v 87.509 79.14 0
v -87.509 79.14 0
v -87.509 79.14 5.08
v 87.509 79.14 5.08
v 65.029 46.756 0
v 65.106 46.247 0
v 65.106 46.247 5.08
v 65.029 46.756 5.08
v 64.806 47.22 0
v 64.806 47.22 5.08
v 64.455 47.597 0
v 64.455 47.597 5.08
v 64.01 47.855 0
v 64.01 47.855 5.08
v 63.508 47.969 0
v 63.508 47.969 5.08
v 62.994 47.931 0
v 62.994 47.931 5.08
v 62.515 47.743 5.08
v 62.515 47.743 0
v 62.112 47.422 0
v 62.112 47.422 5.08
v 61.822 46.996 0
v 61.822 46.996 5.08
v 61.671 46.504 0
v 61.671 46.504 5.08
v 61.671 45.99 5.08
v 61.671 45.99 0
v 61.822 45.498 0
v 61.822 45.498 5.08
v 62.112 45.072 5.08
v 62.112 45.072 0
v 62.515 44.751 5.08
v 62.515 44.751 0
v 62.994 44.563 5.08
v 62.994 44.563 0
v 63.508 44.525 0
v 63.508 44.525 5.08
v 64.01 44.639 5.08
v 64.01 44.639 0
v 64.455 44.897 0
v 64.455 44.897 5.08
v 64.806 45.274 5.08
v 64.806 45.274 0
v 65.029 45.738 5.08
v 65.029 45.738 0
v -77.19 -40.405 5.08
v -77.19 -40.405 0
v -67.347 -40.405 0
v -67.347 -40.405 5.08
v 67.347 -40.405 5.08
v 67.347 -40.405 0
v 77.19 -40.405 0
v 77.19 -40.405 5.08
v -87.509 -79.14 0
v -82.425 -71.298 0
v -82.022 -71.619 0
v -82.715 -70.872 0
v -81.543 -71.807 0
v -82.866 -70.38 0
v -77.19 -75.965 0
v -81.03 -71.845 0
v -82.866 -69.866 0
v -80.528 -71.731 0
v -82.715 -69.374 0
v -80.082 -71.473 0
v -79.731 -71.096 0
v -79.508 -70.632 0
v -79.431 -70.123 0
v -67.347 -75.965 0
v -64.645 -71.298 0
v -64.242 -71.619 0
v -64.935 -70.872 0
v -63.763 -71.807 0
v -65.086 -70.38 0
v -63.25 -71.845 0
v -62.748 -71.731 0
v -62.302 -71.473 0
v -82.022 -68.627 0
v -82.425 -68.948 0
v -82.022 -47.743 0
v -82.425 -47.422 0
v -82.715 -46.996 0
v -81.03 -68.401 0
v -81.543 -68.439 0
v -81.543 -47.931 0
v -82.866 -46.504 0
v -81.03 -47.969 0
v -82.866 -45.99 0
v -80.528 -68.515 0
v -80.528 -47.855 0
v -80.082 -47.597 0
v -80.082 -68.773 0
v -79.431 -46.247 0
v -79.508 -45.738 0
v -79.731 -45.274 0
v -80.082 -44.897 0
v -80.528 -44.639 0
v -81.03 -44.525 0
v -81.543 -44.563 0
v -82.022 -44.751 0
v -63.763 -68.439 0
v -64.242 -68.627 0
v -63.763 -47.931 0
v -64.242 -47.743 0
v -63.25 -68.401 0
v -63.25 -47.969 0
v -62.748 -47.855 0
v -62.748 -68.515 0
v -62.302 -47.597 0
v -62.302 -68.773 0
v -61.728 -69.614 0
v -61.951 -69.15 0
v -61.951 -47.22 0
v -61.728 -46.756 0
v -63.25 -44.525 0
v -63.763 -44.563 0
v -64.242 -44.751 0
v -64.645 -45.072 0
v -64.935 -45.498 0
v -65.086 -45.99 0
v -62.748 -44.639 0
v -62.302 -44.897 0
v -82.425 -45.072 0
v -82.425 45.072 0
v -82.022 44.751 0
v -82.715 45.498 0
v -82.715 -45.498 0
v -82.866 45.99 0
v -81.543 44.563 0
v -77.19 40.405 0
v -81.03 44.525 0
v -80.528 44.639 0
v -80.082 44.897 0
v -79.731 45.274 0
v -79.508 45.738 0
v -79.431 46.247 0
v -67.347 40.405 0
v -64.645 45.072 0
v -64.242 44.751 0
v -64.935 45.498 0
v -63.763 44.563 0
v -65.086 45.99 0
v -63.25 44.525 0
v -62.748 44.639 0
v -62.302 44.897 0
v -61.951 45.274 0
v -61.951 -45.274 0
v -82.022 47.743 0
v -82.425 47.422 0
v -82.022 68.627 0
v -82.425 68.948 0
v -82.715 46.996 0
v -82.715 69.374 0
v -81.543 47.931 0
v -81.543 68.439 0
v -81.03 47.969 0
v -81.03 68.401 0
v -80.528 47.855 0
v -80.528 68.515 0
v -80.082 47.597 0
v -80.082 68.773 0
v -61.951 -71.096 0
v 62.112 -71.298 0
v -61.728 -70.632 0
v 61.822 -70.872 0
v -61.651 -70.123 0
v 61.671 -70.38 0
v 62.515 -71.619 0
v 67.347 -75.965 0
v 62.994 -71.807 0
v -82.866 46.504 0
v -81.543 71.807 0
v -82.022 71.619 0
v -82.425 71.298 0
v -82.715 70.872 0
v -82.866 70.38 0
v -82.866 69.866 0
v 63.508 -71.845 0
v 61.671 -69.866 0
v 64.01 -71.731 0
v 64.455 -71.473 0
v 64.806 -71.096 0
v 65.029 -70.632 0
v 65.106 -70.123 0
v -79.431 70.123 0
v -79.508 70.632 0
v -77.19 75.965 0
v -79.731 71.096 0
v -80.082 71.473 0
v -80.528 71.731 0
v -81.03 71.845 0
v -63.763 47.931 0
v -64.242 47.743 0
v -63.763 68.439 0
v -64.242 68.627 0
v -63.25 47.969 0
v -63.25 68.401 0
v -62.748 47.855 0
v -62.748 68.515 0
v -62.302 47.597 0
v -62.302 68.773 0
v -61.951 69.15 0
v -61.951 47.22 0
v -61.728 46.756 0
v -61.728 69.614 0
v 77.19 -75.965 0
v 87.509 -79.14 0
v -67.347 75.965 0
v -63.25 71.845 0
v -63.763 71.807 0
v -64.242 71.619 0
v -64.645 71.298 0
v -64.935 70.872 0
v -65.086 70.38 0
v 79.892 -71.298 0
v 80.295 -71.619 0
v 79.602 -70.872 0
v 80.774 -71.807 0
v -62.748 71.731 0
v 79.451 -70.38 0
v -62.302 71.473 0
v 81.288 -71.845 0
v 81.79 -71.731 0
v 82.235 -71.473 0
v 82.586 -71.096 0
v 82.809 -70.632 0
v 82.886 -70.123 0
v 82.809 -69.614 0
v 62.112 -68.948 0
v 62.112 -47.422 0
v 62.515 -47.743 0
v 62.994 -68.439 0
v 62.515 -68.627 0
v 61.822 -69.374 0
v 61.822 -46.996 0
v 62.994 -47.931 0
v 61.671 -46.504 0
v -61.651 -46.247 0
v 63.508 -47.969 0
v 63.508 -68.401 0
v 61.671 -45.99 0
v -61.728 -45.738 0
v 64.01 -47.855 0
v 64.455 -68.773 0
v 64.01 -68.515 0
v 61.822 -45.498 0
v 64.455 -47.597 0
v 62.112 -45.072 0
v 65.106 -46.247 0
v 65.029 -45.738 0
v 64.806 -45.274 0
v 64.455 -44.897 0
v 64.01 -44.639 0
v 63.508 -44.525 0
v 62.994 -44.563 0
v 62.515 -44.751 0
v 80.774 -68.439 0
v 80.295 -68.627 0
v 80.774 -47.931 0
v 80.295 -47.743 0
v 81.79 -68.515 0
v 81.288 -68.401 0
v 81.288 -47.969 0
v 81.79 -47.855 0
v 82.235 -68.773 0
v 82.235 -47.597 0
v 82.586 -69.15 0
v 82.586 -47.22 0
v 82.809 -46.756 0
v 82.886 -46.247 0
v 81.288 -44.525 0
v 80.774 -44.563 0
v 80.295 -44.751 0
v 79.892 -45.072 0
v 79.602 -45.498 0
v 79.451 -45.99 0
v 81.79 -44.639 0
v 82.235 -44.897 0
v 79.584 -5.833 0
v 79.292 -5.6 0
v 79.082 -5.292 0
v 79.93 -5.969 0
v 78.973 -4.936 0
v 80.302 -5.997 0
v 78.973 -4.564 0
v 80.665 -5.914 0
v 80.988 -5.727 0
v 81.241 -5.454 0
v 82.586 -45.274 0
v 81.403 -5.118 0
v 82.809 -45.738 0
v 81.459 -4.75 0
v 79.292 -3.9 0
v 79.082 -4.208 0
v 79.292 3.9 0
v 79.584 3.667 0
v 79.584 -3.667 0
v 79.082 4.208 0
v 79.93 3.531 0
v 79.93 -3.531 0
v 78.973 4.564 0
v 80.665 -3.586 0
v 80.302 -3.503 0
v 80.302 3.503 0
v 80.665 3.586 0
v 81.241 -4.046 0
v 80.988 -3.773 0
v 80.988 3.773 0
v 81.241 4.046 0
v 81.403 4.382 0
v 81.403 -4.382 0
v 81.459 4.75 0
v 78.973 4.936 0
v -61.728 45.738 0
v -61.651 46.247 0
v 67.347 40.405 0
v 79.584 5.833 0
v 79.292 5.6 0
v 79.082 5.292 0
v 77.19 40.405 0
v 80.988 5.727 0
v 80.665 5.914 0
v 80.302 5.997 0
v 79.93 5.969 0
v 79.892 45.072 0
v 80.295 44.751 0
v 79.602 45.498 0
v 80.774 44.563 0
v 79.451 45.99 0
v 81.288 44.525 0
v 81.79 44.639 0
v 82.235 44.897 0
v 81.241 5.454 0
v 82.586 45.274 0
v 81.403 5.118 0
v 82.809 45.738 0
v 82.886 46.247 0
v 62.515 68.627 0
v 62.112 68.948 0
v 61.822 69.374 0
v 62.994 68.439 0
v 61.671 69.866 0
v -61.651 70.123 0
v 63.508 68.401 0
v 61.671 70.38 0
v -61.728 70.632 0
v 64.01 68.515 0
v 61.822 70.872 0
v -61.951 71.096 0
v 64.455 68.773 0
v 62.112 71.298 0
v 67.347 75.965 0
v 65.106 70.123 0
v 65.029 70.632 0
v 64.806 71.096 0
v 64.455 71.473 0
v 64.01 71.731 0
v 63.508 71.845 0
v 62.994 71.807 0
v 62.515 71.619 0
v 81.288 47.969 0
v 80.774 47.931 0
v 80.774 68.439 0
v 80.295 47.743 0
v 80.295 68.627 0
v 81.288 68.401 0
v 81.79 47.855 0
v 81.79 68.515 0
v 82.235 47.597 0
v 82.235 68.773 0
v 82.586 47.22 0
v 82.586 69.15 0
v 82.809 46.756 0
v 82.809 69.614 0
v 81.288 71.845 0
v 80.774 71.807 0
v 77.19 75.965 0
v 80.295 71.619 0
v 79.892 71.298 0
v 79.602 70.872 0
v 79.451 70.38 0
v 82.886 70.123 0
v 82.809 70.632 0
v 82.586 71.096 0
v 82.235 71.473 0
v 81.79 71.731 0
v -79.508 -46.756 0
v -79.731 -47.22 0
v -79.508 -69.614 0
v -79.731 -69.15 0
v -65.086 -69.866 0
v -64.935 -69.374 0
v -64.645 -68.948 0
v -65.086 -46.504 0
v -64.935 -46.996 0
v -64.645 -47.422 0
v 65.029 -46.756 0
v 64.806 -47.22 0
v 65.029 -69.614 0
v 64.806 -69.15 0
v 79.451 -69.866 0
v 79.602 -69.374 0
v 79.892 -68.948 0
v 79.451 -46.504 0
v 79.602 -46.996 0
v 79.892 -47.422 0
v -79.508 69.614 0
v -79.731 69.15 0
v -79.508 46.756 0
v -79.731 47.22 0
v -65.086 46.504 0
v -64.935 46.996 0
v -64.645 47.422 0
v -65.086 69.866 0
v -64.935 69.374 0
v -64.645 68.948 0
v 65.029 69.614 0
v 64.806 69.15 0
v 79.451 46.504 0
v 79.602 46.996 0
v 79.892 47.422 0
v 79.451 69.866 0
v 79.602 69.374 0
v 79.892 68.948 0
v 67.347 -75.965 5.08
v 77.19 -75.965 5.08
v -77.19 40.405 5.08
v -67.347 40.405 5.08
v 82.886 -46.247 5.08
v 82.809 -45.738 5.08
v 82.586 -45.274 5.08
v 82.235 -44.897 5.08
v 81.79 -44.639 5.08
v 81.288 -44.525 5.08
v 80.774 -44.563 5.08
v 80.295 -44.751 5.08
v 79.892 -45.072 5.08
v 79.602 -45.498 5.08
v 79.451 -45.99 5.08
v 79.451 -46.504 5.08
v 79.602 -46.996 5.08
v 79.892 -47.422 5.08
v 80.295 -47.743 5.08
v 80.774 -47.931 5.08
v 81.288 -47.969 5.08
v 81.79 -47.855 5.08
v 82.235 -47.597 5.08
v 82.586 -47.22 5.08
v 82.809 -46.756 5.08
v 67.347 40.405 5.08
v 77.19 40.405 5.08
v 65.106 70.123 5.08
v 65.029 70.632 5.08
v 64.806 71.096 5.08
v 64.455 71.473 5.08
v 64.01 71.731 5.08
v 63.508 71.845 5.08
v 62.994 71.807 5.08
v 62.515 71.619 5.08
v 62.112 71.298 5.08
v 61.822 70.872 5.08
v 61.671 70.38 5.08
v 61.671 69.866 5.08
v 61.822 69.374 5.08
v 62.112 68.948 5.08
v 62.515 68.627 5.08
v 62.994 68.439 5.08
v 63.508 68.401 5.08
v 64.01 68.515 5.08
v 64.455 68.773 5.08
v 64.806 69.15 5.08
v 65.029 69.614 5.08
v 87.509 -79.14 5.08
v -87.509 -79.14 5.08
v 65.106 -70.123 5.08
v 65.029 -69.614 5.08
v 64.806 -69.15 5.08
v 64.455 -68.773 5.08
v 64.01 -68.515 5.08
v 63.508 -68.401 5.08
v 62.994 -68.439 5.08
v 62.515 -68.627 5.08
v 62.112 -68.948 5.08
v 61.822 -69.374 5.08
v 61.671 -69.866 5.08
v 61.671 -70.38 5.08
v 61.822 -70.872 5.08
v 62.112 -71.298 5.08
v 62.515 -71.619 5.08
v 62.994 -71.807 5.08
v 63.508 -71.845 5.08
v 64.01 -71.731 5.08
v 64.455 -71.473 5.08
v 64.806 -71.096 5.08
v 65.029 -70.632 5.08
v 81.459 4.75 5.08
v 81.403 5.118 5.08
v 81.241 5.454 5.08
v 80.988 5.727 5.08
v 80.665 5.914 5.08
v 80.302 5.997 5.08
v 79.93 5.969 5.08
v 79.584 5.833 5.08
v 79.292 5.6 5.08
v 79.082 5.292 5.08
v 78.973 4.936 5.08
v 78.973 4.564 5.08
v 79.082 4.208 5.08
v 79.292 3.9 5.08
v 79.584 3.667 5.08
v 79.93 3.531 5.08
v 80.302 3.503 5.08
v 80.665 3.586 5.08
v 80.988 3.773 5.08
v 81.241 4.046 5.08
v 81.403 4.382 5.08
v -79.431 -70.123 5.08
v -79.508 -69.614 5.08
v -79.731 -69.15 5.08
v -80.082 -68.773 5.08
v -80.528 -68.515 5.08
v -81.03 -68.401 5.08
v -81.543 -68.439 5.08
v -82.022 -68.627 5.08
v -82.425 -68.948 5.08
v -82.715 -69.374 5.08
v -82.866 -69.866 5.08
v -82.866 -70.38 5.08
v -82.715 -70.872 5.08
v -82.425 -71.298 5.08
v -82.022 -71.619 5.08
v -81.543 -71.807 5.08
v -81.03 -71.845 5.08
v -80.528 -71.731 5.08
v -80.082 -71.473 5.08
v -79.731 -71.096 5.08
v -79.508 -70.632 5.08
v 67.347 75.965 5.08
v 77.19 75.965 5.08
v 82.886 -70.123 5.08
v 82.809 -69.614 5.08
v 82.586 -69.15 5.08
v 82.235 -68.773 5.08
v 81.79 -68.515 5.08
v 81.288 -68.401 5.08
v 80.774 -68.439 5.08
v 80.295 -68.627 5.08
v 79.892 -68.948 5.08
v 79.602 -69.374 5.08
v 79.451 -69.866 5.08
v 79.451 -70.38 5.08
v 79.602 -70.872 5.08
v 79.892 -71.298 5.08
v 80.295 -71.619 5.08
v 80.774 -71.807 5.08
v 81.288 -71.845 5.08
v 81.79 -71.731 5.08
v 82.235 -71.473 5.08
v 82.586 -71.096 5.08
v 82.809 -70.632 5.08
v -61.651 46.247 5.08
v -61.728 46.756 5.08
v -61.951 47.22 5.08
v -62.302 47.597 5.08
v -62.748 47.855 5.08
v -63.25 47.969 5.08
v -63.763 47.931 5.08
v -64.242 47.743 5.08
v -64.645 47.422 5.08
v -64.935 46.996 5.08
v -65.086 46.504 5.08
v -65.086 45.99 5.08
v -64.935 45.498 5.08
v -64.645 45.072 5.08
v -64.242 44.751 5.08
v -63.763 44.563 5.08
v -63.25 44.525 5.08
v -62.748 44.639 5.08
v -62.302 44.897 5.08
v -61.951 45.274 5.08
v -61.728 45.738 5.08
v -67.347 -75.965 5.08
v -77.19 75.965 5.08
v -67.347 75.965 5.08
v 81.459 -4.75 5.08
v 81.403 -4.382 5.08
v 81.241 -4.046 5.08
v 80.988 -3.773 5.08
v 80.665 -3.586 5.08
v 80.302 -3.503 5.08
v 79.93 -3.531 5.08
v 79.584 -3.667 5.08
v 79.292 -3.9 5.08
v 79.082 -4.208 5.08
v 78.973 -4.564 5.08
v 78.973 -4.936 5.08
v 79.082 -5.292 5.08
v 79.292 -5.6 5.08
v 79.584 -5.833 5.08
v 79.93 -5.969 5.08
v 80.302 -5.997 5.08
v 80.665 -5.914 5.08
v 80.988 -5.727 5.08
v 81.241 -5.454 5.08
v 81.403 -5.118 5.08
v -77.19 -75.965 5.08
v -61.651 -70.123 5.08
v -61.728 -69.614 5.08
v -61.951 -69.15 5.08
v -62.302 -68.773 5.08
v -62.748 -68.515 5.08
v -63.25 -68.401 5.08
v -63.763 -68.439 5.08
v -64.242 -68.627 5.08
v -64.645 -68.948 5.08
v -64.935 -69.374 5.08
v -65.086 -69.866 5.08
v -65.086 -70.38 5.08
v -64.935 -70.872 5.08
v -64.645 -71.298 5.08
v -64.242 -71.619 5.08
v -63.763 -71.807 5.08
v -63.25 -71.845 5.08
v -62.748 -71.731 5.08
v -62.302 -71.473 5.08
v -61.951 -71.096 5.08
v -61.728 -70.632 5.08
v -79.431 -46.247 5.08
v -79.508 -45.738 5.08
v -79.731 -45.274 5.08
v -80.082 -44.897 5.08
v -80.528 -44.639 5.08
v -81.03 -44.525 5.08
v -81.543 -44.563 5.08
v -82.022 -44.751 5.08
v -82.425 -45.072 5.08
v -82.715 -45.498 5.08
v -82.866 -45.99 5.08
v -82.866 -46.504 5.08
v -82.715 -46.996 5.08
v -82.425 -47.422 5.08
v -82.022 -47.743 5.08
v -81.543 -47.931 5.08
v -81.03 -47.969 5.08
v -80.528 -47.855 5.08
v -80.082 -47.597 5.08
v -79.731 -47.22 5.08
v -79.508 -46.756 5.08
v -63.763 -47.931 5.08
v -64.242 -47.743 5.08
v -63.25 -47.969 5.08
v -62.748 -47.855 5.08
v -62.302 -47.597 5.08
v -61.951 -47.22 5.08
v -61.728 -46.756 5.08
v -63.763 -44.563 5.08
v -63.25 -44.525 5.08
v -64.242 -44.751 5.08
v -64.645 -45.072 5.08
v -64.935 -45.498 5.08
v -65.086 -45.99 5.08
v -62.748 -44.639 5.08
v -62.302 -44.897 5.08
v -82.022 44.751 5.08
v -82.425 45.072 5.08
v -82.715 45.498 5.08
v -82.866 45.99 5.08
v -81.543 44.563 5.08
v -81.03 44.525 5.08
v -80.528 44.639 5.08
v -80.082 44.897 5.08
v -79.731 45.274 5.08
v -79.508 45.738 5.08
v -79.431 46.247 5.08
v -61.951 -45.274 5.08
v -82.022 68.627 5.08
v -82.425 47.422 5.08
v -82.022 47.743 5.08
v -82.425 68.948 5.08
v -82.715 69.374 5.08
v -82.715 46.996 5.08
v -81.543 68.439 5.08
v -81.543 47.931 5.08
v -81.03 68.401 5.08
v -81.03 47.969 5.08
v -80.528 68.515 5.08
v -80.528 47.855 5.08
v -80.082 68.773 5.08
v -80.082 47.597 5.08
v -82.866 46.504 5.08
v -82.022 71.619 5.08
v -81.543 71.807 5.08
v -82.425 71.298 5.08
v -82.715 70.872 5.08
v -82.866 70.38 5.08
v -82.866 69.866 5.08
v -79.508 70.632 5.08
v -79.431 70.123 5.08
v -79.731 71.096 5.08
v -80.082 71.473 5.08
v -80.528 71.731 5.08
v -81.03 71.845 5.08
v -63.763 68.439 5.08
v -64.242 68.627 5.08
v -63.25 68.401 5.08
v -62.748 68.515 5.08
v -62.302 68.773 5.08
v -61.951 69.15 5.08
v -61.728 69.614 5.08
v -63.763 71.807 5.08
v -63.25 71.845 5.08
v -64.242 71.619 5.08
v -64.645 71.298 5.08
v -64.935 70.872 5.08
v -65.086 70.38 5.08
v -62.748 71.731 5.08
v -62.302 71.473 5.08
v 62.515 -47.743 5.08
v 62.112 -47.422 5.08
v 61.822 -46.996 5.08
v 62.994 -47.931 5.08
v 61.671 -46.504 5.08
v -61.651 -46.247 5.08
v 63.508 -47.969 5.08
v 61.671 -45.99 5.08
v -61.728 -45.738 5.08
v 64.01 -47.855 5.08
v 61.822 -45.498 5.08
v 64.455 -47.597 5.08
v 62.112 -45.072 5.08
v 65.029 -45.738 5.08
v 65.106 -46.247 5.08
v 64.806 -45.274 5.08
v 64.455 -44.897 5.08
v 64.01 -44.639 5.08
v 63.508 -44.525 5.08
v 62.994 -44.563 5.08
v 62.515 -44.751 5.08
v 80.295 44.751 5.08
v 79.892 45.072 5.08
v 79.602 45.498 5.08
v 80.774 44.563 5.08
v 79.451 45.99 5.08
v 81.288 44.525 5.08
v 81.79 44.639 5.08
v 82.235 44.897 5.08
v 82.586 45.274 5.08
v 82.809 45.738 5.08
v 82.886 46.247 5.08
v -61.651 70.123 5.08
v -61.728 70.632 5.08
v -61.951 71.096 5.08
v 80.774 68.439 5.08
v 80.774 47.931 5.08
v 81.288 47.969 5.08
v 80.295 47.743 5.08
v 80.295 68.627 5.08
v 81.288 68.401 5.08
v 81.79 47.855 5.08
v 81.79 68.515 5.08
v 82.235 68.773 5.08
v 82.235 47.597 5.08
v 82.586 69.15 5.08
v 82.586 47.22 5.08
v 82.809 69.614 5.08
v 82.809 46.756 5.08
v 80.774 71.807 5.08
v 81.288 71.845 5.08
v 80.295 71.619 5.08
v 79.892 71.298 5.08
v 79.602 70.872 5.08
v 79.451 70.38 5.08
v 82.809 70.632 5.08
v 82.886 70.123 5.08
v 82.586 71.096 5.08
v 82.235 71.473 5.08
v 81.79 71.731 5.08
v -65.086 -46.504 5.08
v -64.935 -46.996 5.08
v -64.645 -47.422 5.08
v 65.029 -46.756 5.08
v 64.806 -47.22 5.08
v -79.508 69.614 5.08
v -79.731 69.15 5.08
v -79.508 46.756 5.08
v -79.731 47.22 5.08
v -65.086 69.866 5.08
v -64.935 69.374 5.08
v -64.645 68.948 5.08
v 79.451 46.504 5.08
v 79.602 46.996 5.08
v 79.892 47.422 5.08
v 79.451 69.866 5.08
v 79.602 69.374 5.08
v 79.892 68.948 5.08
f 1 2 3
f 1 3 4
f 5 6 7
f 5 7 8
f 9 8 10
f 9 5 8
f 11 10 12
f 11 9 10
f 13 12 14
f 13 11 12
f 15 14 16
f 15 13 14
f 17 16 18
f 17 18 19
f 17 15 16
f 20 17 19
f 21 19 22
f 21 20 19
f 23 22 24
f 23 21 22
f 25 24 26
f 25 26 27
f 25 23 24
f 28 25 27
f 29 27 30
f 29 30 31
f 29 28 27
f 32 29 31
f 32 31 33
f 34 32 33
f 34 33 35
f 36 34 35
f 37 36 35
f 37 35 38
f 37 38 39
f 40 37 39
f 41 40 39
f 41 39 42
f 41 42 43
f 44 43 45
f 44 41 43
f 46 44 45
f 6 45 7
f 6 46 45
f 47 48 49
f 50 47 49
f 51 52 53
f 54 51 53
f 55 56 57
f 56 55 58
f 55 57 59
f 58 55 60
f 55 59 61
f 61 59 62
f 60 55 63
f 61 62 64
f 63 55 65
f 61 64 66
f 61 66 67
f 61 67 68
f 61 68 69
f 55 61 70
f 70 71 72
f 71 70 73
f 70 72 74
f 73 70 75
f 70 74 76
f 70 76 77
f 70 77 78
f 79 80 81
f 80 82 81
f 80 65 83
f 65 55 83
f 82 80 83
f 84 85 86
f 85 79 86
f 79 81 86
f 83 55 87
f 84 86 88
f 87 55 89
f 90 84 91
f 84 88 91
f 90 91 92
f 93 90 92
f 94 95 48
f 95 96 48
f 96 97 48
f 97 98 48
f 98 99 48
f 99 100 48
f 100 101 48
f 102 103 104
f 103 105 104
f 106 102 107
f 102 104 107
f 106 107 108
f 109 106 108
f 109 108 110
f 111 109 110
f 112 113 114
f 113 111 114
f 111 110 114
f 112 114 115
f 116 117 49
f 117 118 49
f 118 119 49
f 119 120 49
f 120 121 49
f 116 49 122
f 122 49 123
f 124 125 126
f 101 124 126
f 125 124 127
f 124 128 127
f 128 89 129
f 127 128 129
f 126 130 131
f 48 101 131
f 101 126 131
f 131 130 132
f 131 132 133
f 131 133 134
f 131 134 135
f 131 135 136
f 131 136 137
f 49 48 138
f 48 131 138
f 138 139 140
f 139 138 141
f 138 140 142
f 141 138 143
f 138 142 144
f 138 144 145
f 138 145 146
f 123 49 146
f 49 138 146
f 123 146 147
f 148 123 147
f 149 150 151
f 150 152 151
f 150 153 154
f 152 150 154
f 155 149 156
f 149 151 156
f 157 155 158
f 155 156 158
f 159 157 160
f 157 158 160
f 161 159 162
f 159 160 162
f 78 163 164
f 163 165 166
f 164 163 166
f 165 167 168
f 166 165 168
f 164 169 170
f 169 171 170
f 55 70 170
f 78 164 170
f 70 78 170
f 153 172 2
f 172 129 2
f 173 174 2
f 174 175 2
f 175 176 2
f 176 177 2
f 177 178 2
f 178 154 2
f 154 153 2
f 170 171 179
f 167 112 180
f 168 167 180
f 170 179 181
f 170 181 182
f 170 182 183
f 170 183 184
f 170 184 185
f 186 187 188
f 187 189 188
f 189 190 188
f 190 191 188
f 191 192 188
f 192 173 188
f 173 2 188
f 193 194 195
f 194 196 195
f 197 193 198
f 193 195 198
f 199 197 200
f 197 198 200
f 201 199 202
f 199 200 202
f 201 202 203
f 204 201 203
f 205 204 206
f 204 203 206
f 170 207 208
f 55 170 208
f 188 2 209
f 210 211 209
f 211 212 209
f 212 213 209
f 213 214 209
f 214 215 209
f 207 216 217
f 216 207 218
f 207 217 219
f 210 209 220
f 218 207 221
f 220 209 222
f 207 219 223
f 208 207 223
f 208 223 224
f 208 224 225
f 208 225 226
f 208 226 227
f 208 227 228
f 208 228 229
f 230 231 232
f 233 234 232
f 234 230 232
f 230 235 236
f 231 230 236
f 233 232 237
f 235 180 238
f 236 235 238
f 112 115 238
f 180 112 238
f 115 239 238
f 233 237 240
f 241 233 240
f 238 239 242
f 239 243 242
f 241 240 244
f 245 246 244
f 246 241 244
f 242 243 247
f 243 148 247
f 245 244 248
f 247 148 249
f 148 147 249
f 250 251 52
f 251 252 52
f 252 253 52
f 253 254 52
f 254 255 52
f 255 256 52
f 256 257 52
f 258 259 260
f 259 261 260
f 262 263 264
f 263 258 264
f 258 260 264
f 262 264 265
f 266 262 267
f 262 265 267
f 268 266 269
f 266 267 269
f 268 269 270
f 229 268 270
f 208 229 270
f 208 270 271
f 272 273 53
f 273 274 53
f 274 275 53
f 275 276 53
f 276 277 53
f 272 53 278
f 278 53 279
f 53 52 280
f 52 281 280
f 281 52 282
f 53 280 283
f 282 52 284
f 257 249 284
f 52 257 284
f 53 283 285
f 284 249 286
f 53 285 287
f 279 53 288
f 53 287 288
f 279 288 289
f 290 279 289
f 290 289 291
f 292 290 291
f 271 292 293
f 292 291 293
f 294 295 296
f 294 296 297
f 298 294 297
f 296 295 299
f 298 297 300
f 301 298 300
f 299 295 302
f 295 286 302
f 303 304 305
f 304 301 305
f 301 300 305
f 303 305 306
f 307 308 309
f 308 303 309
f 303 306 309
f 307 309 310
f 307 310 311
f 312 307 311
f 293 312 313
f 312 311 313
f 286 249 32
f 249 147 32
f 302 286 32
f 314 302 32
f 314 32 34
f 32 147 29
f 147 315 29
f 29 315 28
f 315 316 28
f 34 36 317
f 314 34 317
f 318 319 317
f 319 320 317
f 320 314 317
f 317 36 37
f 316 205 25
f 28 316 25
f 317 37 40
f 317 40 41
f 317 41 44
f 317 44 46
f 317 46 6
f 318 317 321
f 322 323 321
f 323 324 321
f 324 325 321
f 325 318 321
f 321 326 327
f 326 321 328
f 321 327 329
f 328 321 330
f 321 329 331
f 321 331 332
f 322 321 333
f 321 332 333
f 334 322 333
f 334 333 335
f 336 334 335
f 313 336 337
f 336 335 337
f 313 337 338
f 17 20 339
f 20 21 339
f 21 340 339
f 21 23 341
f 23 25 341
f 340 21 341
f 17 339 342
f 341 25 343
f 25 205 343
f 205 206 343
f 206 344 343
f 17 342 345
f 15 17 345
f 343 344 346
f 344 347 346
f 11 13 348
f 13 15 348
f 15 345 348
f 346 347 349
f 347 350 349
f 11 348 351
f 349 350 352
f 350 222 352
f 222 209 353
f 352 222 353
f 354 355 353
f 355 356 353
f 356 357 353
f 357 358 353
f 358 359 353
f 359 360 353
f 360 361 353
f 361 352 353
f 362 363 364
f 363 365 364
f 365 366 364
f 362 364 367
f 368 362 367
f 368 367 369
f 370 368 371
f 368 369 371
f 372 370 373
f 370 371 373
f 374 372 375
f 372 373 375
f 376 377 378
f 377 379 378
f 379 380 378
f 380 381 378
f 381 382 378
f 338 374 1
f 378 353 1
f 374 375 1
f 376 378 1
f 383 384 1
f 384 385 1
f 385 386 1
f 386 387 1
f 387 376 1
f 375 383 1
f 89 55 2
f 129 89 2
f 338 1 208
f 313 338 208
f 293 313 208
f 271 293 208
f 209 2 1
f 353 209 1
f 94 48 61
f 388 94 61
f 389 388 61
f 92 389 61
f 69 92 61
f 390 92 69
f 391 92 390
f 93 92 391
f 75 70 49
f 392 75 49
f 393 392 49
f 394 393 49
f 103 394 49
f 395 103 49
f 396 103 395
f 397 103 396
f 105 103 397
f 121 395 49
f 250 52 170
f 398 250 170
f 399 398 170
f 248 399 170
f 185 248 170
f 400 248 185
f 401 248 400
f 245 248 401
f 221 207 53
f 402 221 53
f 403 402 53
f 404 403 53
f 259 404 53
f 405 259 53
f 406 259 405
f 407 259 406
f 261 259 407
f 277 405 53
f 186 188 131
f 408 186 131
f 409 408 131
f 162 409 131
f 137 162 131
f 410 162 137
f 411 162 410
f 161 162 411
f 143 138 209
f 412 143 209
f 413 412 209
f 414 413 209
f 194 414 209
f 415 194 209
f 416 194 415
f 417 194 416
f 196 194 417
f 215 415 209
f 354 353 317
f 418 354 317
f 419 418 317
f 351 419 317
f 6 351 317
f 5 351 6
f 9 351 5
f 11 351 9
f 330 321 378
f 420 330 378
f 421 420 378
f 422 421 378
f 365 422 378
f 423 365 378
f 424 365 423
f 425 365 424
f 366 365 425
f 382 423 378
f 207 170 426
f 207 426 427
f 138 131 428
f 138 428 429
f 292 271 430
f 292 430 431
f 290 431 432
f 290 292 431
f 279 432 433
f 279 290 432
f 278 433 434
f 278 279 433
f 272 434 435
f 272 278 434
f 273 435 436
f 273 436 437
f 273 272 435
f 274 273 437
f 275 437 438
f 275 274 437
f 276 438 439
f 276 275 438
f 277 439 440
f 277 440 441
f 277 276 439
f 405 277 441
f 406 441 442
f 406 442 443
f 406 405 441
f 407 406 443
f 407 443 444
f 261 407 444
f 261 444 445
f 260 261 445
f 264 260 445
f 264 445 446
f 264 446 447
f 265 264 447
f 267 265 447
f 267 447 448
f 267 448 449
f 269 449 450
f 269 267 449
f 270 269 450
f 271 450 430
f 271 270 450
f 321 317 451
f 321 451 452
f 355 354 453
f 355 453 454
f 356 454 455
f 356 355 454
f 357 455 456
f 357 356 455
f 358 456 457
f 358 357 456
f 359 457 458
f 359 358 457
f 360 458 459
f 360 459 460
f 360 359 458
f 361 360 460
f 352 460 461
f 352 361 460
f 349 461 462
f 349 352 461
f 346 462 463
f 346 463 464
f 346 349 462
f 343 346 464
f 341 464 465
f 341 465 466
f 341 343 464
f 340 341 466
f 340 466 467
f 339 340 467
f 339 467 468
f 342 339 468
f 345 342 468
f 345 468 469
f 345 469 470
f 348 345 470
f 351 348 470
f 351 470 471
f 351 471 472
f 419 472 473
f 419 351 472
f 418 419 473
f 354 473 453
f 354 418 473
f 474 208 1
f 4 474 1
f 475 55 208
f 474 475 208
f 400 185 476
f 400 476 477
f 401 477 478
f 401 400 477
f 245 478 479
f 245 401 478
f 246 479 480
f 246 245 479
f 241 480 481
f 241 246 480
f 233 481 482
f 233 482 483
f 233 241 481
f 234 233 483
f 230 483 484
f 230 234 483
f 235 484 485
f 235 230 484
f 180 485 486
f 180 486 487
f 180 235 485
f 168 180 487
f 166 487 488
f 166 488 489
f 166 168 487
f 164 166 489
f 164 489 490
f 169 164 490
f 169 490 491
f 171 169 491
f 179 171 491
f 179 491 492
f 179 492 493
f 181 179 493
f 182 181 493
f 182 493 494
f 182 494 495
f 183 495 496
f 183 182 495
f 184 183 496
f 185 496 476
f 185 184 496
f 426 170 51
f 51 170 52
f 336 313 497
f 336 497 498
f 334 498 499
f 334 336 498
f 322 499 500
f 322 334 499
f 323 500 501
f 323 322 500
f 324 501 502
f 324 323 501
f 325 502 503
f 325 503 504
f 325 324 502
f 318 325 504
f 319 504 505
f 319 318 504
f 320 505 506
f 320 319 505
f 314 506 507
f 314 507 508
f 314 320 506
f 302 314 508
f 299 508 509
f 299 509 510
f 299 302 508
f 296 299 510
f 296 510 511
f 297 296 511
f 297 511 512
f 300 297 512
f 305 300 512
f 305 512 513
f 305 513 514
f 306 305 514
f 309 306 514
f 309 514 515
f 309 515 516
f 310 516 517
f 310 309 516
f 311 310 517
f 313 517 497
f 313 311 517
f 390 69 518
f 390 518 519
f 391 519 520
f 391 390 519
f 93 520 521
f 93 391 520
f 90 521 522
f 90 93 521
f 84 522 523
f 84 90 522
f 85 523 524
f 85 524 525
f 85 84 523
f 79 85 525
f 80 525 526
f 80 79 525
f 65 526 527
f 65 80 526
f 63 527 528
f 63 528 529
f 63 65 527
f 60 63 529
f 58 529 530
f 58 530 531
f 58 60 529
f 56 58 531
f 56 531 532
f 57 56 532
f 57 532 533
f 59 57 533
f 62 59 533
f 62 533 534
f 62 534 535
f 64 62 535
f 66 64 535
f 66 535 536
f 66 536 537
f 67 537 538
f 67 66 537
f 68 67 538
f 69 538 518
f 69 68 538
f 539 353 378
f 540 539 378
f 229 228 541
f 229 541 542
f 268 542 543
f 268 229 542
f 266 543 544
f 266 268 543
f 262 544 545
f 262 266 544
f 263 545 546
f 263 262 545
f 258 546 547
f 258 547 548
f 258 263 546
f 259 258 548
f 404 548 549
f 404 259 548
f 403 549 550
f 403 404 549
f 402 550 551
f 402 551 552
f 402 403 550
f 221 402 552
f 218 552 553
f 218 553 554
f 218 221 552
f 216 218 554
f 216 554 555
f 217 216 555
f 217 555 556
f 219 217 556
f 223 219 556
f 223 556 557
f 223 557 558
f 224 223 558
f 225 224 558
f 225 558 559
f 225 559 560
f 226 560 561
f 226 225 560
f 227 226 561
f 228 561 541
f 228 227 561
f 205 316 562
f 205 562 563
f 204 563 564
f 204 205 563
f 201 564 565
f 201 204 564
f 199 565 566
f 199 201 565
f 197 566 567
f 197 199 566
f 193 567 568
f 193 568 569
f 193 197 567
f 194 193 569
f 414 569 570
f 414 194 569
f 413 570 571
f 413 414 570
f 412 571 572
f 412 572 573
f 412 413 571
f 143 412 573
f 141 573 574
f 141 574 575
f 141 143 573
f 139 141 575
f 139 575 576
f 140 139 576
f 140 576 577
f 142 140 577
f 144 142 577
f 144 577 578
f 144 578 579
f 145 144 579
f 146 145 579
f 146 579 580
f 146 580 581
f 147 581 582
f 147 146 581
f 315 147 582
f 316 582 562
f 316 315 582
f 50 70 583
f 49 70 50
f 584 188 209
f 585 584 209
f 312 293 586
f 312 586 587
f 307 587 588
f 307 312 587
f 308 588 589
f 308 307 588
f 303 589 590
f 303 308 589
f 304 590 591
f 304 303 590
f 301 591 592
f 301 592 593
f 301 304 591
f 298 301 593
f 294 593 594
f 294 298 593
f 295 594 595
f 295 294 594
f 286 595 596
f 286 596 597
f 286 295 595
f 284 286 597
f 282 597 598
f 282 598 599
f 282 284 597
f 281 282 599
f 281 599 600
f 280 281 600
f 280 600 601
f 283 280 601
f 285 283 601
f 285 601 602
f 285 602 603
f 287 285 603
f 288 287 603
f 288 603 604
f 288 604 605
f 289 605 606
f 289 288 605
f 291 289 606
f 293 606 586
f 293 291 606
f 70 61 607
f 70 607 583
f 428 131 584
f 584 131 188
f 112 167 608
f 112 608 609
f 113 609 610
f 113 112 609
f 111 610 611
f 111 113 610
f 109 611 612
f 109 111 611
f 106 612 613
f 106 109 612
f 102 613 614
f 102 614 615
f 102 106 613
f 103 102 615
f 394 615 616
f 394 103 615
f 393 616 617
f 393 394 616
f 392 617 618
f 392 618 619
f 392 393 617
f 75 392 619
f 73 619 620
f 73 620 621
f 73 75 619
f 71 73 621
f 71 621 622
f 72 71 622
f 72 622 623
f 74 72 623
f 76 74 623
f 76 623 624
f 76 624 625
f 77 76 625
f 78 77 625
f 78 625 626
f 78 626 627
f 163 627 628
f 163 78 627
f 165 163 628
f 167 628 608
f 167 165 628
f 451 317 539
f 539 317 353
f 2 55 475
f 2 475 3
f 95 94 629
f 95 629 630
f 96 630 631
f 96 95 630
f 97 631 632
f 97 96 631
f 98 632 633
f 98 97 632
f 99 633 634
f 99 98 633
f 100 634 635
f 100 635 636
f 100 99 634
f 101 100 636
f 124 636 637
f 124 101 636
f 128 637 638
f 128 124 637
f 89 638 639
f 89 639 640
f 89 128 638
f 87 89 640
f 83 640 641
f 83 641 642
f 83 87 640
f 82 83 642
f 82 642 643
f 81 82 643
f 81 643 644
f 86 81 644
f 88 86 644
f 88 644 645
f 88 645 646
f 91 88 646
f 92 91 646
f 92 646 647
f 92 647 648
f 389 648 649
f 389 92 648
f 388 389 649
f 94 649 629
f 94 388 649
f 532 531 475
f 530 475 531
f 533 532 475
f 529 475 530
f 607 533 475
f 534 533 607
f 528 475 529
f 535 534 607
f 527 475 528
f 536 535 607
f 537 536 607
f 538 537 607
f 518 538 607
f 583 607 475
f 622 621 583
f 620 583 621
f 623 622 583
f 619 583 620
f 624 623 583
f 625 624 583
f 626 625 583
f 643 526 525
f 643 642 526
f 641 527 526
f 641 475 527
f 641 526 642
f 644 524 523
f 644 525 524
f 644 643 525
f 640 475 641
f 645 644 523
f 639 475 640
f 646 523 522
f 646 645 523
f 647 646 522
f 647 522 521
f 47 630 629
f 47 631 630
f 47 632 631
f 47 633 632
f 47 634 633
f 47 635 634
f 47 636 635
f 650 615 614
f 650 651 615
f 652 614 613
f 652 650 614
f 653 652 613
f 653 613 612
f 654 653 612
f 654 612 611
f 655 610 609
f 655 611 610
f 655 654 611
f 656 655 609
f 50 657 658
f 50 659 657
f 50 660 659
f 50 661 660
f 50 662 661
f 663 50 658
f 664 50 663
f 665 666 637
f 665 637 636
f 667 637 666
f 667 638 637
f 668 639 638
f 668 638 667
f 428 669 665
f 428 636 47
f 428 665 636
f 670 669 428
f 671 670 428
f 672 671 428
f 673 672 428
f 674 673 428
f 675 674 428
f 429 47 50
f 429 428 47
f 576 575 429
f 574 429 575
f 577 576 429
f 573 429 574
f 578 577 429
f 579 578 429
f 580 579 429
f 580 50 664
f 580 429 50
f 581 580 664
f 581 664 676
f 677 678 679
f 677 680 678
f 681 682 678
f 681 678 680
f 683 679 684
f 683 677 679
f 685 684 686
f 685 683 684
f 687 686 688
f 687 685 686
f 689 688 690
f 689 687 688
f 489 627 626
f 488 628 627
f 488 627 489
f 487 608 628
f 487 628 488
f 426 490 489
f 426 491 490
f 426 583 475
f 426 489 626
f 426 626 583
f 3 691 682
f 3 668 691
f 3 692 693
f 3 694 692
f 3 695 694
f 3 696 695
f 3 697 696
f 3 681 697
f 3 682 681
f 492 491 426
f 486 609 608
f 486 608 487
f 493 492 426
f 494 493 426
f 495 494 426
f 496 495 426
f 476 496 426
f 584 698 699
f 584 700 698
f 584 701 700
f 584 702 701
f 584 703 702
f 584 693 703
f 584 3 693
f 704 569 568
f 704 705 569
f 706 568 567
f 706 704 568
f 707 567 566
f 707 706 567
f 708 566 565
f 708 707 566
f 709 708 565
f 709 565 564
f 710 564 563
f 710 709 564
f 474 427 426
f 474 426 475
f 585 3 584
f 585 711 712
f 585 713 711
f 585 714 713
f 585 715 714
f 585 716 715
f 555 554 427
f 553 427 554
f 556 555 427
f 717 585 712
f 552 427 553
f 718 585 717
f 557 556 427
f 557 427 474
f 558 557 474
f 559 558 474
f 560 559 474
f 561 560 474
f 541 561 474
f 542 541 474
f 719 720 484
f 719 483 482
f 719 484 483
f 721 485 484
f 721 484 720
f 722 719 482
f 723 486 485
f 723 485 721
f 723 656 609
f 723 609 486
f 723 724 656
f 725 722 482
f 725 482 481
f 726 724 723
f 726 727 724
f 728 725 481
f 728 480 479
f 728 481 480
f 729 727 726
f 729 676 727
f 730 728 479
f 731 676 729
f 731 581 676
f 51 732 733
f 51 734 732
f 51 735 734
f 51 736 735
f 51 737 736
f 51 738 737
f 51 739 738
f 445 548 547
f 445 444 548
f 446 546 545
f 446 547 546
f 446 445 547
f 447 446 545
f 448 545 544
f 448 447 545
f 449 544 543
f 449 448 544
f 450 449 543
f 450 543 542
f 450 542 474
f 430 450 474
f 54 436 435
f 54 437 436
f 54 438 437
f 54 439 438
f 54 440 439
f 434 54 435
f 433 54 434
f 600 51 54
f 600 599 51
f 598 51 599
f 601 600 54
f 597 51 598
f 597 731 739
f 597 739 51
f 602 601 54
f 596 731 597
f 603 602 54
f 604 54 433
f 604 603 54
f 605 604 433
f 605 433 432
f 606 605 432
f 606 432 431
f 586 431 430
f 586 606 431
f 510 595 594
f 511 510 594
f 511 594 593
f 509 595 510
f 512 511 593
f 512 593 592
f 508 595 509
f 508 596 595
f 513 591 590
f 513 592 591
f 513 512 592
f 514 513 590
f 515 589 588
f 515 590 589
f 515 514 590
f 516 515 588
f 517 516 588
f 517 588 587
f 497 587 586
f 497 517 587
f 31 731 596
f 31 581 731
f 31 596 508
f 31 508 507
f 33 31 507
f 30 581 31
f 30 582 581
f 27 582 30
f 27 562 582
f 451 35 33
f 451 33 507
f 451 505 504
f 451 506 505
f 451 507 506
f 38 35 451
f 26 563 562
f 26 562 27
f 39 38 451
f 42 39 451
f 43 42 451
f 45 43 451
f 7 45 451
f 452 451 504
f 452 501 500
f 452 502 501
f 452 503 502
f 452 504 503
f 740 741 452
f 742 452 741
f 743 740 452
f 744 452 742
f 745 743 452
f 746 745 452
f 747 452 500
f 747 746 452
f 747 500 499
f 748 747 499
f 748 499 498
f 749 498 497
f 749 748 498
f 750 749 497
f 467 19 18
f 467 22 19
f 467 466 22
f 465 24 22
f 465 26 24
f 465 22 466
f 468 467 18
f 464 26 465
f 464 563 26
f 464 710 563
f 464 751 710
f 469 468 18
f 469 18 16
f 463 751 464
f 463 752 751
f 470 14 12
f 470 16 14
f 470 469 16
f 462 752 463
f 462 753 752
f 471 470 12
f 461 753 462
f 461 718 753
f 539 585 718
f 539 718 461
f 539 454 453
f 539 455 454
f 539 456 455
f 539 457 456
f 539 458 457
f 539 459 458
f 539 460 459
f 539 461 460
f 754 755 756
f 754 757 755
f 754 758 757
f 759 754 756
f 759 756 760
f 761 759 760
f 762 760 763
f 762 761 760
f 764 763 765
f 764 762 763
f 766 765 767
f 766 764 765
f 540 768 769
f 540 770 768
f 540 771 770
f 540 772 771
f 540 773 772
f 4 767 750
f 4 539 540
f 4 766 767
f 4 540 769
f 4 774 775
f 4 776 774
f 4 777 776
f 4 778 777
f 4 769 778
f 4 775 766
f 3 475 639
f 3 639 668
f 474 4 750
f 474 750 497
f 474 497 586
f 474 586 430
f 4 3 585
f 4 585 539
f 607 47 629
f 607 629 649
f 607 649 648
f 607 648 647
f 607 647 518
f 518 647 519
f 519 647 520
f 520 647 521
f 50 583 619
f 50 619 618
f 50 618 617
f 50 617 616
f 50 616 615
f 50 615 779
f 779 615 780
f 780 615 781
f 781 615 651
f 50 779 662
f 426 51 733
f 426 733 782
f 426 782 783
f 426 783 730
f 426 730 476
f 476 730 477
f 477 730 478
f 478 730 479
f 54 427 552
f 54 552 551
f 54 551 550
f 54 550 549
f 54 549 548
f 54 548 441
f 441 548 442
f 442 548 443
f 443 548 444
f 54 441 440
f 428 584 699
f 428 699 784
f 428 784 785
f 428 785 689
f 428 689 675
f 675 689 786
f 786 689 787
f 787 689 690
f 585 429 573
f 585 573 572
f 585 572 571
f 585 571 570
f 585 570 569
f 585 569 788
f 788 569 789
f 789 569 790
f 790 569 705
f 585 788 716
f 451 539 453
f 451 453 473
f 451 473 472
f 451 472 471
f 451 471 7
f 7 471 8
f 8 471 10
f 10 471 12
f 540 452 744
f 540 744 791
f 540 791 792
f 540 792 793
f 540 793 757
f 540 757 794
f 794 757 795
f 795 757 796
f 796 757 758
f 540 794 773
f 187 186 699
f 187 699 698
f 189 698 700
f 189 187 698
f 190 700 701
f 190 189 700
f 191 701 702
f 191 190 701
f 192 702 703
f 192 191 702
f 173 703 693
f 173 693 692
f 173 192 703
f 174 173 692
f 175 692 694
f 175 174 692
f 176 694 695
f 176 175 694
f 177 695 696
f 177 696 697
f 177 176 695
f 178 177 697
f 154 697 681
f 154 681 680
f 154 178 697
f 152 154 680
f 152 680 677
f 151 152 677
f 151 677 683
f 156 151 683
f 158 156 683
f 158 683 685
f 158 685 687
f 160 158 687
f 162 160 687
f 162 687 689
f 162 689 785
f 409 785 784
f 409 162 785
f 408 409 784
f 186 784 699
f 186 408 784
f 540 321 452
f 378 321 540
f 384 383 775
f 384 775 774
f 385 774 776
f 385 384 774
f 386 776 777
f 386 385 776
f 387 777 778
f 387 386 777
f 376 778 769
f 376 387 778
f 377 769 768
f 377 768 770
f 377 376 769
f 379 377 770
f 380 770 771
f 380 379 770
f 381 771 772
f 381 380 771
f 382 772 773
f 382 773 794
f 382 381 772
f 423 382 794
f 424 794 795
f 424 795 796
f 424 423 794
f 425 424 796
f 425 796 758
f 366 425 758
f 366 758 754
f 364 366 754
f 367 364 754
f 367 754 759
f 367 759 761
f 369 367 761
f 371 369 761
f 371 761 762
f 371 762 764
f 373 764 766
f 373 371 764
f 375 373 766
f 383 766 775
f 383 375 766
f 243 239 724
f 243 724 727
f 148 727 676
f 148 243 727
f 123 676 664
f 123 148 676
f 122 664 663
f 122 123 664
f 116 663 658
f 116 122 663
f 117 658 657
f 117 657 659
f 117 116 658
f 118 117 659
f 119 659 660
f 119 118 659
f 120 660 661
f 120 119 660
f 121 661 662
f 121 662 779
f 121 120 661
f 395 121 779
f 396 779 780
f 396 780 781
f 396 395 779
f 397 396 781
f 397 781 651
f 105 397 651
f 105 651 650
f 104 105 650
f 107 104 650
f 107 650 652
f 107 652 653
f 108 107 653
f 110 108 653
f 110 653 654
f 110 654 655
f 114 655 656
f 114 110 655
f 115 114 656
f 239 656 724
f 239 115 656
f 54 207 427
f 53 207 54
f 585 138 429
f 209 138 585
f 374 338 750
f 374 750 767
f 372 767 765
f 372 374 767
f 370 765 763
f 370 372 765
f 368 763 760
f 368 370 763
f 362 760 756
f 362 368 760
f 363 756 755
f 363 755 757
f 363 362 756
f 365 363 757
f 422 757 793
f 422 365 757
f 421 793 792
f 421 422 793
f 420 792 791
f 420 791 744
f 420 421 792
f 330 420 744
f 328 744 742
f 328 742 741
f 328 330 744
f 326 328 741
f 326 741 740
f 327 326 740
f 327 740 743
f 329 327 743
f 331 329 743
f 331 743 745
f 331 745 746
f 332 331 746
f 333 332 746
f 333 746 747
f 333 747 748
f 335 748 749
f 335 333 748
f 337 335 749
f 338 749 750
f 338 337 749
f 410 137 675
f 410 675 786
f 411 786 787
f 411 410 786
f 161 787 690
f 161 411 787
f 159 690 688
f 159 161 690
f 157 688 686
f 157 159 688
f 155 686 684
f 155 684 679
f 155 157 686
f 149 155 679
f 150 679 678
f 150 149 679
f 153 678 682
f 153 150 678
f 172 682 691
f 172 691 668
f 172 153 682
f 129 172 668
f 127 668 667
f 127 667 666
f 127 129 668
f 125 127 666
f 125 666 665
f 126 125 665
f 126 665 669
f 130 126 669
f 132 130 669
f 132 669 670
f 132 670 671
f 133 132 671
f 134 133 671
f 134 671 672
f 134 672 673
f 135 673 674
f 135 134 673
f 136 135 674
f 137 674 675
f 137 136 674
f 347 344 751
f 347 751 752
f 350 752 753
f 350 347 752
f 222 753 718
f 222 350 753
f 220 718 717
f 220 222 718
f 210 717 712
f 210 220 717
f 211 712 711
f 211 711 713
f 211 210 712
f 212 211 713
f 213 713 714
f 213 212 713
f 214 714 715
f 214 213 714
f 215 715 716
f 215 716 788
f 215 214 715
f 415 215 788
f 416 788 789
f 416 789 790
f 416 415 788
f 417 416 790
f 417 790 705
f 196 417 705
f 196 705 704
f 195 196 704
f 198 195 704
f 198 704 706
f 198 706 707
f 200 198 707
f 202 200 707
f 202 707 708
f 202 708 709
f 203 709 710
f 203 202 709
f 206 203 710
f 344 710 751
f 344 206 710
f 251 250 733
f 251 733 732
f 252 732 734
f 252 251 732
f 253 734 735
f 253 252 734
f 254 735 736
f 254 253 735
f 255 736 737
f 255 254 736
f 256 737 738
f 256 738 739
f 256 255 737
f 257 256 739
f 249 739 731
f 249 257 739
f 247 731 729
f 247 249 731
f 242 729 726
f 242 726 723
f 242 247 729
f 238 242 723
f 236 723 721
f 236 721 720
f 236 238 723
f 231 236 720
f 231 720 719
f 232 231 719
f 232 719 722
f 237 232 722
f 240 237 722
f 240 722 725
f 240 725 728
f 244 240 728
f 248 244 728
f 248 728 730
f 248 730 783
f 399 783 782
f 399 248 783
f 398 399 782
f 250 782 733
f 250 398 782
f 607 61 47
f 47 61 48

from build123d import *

# Parameters (mm, degrees)
F0_W     = 175.01715
F0_H     = 158.2801
F0_R     = 1.7272
F0_W_2   = 9.8425
F0_H_2   = 35.56
F0_R_2   = 1.25
F1_DEPTH = 5.08


with BuildPart() as f1:
    # F0 (on Top) → F1 (new body)
    with BuildSketch(Plane.XY):
        Rectangle(F0_W, F0_H)
        with Locations((-81.158575, -70.12305)):
            Circle(F0_R, mode=Mode.SUBTRACT)
        with Locations((-63.378575, -70.12305)):
            Circle(F0_R, mode=Mode.SUBTRACT)
        with Locations((-72.268575, -58.18505)):
            Rectangle(F0_W_2, F0_H_2, mode=Mode.SUBTRACT)
        with Locations((-81.158575, -46.24705)):
            Circle(F0_R, mode=Mode.SUBTRACT)
        with Locations((-63.378575, -46.24705)):
            Circle(F0_R, mode=Mode.SUBTRACT)
        with Locations((63.378575, -70.12305)):
            Circle(F0_R, mode=Mode.SUBTRACT)
        with Locations((81.158575, -70.12305)):
            Circle(F0_R, mode=Mode.SUBTRACT)
        with Locations((63.378575, -46.24705)):
            Circle(F0_R, mode=Mode.SUBTRACT)
        with Locations((72.268575, -58.18505)):
            Rectangle(F0_W_2, F0_H_2, mode=Mode.SUBTRACT)
        with Locations((81.158575, -46.24705)):
            Circle(F0_R, mode=Mode.SUBTRACT)
        with Locations((80.208564, -4.750003)):
            Circle(F0_R_2, mode=Mode.SUBTRACT)
        with Locations((-81.158575, 46.24705)):
            Circle(F0_R, mode=Mode.SUBTRACT)
        with Locations((-72.268575, 58.18505)):
            Rectangle(F0_W_2, F0_H_2, mode=Mode.SUBTRACT)
        with Locations((-63.378575, 46.24705)):
            Circle(F0_R, mode=Mode.SUBTRACT)
        with Locations((-81.158575, 70.12305)):
            Circle(F0_R, mode=Mode.SUBTRACT)
        with Locations((-63.378575, 70.12305)):
            Circle(F0_R, mode=Mode.SUBTRACT)
        with Locations((80.208564, 4.750003)):
            Circle(F0_R_2, mode=Mode.SUBTRACT)
        with Locations((63.378575, 46.24705)):
            Circle(F0_R, mode=Mode.SUBTRACT)
        with Locations((81.158575, 46.24705)):
            Circle(F0_R, mode=Mode.SUBTRACT)
        with Locations((72.268575, 58.18505)):
            Rectangle(F0_W_2, F0_H_2, mode=Mode.SUBTRACT)
        with Locations((63.378575, 70.12305)):
            Circle(F0_R, mode=Mode.SUBTRACT)
        with Locations((81.158575, 70.12305)):
            Circle(F0_R, mode=Mode.SUBTRACT)
    extrude(amount=F1_DEPTH)


solid = f1.part
